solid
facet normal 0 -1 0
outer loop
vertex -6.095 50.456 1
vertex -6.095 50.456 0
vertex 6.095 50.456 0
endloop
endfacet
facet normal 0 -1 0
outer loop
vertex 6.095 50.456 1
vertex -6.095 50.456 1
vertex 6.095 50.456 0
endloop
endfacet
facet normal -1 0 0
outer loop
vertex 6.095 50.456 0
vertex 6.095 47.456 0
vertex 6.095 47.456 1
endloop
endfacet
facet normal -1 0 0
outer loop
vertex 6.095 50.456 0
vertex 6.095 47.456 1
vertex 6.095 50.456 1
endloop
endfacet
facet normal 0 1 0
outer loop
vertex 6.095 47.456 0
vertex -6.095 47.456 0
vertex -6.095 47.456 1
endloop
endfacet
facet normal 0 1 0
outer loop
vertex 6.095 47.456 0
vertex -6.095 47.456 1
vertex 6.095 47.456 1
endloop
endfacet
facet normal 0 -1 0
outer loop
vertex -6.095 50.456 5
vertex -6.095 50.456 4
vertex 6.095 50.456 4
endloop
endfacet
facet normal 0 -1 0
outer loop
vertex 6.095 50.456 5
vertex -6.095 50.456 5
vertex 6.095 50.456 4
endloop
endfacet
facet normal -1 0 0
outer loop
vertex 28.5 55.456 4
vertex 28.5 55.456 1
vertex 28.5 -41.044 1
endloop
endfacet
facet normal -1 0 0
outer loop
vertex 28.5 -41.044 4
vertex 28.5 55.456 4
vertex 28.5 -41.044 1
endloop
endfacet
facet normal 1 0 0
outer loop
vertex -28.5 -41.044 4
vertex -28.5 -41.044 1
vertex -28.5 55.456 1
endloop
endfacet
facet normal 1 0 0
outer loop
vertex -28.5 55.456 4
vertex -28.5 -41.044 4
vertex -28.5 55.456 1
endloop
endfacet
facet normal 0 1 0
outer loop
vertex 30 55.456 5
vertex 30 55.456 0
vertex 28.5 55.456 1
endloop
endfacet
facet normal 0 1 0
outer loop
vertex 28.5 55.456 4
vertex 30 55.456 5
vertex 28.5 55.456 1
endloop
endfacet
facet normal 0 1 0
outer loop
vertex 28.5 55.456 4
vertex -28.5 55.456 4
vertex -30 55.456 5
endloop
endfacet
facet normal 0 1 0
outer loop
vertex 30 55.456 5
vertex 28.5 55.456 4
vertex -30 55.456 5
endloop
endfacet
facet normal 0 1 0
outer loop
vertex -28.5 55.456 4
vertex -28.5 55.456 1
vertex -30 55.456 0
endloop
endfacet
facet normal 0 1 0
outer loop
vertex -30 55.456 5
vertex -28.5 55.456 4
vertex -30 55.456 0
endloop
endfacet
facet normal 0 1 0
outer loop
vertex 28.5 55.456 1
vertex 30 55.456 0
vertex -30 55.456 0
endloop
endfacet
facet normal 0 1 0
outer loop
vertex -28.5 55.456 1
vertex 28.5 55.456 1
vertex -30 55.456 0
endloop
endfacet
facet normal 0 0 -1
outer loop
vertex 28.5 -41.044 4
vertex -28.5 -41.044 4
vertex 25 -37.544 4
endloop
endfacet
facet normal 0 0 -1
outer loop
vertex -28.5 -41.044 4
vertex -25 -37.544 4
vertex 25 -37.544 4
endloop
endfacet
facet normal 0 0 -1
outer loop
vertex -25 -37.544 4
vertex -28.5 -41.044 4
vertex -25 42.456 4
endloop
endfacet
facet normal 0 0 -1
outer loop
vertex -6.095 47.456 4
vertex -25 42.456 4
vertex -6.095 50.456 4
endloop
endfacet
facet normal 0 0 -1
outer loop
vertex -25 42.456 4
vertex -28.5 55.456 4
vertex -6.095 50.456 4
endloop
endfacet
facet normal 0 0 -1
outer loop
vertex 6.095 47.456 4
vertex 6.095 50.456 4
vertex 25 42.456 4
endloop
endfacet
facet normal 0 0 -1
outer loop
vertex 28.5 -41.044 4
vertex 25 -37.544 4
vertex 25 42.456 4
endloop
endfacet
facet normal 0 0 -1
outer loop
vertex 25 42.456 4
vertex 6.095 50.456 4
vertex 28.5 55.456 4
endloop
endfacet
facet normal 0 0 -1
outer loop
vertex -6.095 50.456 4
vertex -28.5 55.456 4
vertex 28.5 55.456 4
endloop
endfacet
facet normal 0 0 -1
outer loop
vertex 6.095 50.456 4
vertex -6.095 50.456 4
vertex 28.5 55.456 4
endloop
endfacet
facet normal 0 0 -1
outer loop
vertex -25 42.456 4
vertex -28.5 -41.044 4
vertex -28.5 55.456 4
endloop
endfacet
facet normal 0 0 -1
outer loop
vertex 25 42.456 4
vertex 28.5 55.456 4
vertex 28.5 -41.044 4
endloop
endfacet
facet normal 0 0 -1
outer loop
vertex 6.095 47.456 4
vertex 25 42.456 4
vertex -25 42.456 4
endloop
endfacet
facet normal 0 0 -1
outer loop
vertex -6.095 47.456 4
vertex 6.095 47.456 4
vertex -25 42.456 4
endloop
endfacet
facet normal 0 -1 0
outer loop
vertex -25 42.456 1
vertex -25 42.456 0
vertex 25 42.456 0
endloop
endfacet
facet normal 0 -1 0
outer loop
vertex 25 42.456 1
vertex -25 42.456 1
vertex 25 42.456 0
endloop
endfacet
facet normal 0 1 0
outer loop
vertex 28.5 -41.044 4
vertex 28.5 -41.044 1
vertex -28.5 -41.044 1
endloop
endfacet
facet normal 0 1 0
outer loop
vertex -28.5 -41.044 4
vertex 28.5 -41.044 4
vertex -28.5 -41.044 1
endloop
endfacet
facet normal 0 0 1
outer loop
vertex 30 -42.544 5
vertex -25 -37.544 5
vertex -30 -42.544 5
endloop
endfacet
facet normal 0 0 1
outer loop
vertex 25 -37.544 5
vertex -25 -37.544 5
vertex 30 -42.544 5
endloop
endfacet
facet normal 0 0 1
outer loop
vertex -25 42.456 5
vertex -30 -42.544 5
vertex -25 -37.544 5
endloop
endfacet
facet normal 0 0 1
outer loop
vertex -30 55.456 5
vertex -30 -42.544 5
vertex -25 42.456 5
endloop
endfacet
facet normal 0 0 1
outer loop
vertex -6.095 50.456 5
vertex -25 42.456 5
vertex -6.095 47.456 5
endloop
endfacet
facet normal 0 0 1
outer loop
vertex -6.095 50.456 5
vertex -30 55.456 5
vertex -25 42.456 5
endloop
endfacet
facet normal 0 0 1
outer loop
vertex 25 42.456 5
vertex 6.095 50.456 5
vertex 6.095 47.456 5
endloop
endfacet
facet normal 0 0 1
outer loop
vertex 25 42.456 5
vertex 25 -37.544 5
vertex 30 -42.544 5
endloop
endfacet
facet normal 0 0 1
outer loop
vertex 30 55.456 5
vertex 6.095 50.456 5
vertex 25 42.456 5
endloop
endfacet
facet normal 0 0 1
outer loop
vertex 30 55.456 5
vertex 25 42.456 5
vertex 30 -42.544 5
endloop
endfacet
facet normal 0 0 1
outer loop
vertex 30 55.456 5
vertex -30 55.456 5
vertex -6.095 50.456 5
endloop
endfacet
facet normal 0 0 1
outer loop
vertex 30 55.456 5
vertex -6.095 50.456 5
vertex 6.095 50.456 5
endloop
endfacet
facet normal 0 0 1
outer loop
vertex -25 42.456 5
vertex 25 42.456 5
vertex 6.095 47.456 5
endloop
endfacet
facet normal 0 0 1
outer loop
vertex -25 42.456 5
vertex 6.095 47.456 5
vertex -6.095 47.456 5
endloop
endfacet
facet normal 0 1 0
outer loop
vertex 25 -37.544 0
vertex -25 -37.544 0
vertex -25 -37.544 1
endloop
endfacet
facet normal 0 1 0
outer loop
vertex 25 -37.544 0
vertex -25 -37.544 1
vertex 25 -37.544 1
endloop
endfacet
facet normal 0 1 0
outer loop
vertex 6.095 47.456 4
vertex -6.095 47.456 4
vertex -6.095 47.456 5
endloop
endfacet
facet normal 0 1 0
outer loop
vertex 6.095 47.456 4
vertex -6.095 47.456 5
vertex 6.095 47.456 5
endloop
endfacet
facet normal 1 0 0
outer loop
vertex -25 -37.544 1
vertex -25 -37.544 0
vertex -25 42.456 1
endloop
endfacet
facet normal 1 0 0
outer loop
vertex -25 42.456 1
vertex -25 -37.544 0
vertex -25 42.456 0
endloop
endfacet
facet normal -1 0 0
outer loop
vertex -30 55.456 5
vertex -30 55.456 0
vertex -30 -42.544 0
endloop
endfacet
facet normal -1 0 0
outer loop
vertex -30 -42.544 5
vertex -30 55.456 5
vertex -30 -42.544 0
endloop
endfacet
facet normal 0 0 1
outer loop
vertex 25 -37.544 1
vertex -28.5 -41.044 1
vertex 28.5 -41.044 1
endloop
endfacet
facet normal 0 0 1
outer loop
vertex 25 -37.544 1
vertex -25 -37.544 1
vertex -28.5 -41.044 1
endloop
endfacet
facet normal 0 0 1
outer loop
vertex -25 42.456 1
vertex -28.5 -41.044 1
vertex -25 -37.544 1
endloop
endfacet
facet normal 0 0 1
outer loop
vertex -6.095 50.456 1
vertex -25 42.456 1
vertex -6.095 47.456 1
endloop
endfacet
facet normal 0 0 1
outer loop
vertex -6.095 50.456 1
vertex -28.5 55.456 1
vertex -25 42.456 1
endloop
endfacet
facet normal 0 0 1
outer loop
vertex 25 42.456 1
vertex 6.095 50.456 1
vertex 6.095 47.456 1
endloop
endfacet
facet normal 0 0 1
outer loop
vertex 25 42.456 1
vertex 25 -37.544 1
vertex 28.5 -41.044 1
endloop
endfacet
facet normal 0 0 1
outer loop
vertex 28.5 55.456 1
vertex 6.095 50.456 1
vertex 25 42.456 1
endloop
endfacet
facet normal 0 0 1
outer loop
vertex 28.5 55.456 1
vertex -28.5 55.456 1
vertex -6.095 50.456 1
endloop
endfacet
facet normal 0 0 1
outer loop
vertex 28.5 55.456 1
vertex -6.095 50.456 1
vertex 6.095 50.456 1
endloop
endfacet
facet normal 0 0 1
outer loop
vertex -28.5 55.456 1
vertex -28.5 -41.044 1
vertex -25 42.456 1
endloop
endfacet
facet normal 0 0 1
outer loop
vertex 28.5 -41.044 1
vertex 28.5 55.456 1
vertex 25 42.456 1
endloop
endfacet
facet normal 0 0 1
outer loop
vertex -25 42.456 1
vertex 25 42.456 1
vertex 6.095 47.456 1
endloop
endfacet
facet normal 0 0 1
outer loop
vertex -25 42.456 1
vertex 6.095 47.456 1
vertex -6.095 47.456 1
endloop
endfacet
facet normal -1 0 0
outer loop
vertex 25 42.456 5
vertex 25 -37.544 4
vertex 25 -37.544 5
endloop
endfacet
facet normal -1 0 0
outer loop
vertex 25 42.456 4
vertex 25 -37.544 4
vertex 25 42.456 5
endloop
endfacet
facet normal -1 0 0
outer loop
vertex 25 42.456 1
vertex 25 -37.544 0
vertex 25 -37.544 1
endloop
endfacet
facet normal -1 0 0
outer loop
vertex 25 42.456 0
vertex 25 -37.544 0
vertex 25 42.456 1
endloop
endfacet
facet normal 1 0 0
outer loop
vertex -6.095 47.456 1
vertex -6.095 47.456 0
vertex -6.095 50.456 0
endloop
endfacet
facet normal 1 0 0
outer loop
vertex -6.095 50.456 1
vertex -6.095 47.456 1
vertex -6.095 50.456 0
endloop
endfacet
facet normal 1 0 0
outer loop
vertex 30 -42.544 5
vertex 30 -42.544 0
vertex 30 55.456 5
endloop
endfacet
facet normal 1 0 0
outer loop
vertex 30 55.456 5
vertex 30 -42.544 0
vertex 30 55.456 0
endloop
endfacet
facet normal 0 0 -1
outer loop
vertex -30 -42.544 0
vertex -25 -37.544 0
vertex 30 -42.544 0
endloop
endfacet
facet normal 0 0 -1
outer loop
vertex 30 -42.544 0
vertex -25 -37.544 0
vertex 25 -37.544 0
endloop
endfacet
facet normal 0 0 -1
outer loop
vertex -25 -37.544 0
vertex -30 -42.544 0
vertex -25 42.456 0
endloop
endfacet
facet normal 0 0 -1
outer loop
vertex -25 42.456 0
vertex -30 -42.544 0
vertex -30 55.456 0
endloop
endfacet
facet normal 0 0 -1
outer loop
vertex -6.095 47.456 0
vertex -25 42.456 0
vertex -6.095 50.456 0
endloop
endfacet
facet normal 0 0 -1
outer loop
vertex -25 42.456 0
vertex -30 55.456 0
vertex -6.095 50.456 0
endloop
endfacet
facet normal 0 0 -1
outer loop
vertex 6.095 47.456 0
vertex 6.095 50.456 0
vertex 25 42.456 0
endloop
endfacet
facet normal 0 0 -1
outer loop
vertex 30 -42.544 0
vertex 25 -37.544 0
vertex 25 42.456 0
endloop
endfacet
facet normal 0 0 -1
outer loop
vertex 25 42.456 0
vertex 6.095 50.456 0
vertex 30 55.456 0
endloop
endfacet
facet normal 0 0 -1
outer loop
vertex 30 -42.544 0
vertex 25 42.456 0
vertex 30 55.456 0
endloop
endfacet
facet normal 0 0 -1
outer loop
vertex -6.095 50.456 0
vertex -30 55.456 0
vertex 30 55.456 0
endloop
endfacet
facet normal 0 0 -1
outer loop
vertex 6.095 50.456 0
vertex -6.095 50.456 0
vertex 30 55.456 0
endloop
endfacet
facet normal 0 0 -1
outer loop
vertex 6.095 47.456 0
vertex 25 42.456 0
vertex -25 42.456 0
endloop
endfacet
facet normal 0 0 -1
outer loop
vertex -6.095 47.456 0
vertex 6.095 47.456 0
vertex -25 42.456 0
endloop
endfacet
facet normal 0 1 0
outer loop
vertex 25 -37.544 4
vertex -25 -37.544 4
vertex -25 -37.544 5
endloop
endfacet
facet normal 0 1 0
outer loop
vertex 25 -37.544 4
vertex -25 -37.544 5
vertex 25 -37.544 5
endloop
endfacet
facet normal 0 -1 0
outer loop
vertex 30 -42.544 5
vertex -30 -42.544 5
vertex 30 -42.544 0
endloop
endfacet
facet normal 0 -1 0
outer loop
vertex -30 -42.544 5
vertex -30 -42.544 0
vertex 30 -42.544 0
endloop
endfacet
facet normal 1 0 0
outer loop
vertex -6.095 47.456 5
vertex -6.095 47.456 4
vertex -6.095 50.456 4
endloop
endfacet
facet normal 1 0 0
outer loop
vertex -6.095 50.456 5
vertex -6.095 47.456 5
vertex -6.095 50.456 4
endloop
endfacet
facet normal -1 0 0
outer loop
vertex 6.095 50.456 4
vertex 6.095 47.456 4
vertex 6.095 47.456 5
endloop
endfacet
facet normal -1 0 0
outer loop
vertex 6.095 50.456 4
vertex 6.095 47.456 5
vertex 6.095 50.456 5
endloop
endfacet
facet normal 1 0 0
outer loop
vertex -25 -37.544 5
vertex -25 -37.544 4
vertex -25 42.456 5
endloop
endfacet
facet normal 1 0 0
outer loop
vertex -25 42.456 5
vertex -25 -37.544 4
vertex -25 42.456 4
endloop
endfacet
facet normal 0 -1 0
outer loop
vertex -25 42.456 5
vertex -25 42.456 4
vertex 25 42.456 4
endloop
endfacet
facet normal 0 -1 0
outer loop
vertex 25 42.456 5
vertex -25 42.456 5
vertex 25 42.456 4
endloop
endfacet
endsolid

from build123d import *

# Parameters (mm, degrees)
F0_W     = 60
F0_H     = 98
F0_W_2   = 50
F0_H_2   = 80
F0_W_3   = 12.190704
F0_H_3   = 3
F1_DEPTH = 1
F3_DEPTH = 3
F4_W     = 57
F4_H     = 96.5
F4_W_2   = 50
F4_H_2   = 80
F4_W_3   = 12.190704
F4_H_3   = 3
F5_DEPTH = 1


with BuildPart() as f1:
    # F0 (on Top) → F1 (new body)
    with BuildSketch(Plane.XY):
        with Locations((0, 6.455527)):
            Rectangle(F0_W, F0_H)
        with Locations((0, 2.455527)):
            Rectangle(F0_W_2, F0_H_2, mode=Mode.SUBTRACT)
        with Locations((0, 48.955527)):
            Rectangle(F0_W_3, F0_H_3, mode=Mode.SUBTRACT)
    extrude(amount=F1_DEPTH)

    # F2 (on face) → F3 (join)
    with BuildSketch(Plane.XY.offset(1)):
        Polygon((-28.5, 55.455527), (-30, 55.455527), (-30, -42.544473), (30, -42.544473), (30, 55.455527), (28.5, 55.455527), (28.5, -41.044473), (-28.5, -41.044473), align=None)
    extrude(amount=F3_DEPTH)

    # F4 (on face) → F5 (join)
    with BuildSketch(Plane.XY.offset(4)):
        with Locations((0, 7.205527)):
            Rectangle(F4_W, F4_H)
        with Locations((0, 2.455527)):
            Rectangle(F4_W_2, F4_H_2, mode=Mode.SUBTRACT)
        with Locations((0, 48.955527)):
            Rectangle(F4_W_3, F4_H_3, mode=Mode.SUBTRACT)
        Polygon((30, -42.544473), (30, 55.455527), (28.5, 55.455527), (28.5, -41.044473), (-28.5, -41.044473), (-28.5, 55.455527), (-30, 55.455527), (-30, -42.544473), align=None)
    extrude(amount=F5_DEPTH)


solid = f1.part
